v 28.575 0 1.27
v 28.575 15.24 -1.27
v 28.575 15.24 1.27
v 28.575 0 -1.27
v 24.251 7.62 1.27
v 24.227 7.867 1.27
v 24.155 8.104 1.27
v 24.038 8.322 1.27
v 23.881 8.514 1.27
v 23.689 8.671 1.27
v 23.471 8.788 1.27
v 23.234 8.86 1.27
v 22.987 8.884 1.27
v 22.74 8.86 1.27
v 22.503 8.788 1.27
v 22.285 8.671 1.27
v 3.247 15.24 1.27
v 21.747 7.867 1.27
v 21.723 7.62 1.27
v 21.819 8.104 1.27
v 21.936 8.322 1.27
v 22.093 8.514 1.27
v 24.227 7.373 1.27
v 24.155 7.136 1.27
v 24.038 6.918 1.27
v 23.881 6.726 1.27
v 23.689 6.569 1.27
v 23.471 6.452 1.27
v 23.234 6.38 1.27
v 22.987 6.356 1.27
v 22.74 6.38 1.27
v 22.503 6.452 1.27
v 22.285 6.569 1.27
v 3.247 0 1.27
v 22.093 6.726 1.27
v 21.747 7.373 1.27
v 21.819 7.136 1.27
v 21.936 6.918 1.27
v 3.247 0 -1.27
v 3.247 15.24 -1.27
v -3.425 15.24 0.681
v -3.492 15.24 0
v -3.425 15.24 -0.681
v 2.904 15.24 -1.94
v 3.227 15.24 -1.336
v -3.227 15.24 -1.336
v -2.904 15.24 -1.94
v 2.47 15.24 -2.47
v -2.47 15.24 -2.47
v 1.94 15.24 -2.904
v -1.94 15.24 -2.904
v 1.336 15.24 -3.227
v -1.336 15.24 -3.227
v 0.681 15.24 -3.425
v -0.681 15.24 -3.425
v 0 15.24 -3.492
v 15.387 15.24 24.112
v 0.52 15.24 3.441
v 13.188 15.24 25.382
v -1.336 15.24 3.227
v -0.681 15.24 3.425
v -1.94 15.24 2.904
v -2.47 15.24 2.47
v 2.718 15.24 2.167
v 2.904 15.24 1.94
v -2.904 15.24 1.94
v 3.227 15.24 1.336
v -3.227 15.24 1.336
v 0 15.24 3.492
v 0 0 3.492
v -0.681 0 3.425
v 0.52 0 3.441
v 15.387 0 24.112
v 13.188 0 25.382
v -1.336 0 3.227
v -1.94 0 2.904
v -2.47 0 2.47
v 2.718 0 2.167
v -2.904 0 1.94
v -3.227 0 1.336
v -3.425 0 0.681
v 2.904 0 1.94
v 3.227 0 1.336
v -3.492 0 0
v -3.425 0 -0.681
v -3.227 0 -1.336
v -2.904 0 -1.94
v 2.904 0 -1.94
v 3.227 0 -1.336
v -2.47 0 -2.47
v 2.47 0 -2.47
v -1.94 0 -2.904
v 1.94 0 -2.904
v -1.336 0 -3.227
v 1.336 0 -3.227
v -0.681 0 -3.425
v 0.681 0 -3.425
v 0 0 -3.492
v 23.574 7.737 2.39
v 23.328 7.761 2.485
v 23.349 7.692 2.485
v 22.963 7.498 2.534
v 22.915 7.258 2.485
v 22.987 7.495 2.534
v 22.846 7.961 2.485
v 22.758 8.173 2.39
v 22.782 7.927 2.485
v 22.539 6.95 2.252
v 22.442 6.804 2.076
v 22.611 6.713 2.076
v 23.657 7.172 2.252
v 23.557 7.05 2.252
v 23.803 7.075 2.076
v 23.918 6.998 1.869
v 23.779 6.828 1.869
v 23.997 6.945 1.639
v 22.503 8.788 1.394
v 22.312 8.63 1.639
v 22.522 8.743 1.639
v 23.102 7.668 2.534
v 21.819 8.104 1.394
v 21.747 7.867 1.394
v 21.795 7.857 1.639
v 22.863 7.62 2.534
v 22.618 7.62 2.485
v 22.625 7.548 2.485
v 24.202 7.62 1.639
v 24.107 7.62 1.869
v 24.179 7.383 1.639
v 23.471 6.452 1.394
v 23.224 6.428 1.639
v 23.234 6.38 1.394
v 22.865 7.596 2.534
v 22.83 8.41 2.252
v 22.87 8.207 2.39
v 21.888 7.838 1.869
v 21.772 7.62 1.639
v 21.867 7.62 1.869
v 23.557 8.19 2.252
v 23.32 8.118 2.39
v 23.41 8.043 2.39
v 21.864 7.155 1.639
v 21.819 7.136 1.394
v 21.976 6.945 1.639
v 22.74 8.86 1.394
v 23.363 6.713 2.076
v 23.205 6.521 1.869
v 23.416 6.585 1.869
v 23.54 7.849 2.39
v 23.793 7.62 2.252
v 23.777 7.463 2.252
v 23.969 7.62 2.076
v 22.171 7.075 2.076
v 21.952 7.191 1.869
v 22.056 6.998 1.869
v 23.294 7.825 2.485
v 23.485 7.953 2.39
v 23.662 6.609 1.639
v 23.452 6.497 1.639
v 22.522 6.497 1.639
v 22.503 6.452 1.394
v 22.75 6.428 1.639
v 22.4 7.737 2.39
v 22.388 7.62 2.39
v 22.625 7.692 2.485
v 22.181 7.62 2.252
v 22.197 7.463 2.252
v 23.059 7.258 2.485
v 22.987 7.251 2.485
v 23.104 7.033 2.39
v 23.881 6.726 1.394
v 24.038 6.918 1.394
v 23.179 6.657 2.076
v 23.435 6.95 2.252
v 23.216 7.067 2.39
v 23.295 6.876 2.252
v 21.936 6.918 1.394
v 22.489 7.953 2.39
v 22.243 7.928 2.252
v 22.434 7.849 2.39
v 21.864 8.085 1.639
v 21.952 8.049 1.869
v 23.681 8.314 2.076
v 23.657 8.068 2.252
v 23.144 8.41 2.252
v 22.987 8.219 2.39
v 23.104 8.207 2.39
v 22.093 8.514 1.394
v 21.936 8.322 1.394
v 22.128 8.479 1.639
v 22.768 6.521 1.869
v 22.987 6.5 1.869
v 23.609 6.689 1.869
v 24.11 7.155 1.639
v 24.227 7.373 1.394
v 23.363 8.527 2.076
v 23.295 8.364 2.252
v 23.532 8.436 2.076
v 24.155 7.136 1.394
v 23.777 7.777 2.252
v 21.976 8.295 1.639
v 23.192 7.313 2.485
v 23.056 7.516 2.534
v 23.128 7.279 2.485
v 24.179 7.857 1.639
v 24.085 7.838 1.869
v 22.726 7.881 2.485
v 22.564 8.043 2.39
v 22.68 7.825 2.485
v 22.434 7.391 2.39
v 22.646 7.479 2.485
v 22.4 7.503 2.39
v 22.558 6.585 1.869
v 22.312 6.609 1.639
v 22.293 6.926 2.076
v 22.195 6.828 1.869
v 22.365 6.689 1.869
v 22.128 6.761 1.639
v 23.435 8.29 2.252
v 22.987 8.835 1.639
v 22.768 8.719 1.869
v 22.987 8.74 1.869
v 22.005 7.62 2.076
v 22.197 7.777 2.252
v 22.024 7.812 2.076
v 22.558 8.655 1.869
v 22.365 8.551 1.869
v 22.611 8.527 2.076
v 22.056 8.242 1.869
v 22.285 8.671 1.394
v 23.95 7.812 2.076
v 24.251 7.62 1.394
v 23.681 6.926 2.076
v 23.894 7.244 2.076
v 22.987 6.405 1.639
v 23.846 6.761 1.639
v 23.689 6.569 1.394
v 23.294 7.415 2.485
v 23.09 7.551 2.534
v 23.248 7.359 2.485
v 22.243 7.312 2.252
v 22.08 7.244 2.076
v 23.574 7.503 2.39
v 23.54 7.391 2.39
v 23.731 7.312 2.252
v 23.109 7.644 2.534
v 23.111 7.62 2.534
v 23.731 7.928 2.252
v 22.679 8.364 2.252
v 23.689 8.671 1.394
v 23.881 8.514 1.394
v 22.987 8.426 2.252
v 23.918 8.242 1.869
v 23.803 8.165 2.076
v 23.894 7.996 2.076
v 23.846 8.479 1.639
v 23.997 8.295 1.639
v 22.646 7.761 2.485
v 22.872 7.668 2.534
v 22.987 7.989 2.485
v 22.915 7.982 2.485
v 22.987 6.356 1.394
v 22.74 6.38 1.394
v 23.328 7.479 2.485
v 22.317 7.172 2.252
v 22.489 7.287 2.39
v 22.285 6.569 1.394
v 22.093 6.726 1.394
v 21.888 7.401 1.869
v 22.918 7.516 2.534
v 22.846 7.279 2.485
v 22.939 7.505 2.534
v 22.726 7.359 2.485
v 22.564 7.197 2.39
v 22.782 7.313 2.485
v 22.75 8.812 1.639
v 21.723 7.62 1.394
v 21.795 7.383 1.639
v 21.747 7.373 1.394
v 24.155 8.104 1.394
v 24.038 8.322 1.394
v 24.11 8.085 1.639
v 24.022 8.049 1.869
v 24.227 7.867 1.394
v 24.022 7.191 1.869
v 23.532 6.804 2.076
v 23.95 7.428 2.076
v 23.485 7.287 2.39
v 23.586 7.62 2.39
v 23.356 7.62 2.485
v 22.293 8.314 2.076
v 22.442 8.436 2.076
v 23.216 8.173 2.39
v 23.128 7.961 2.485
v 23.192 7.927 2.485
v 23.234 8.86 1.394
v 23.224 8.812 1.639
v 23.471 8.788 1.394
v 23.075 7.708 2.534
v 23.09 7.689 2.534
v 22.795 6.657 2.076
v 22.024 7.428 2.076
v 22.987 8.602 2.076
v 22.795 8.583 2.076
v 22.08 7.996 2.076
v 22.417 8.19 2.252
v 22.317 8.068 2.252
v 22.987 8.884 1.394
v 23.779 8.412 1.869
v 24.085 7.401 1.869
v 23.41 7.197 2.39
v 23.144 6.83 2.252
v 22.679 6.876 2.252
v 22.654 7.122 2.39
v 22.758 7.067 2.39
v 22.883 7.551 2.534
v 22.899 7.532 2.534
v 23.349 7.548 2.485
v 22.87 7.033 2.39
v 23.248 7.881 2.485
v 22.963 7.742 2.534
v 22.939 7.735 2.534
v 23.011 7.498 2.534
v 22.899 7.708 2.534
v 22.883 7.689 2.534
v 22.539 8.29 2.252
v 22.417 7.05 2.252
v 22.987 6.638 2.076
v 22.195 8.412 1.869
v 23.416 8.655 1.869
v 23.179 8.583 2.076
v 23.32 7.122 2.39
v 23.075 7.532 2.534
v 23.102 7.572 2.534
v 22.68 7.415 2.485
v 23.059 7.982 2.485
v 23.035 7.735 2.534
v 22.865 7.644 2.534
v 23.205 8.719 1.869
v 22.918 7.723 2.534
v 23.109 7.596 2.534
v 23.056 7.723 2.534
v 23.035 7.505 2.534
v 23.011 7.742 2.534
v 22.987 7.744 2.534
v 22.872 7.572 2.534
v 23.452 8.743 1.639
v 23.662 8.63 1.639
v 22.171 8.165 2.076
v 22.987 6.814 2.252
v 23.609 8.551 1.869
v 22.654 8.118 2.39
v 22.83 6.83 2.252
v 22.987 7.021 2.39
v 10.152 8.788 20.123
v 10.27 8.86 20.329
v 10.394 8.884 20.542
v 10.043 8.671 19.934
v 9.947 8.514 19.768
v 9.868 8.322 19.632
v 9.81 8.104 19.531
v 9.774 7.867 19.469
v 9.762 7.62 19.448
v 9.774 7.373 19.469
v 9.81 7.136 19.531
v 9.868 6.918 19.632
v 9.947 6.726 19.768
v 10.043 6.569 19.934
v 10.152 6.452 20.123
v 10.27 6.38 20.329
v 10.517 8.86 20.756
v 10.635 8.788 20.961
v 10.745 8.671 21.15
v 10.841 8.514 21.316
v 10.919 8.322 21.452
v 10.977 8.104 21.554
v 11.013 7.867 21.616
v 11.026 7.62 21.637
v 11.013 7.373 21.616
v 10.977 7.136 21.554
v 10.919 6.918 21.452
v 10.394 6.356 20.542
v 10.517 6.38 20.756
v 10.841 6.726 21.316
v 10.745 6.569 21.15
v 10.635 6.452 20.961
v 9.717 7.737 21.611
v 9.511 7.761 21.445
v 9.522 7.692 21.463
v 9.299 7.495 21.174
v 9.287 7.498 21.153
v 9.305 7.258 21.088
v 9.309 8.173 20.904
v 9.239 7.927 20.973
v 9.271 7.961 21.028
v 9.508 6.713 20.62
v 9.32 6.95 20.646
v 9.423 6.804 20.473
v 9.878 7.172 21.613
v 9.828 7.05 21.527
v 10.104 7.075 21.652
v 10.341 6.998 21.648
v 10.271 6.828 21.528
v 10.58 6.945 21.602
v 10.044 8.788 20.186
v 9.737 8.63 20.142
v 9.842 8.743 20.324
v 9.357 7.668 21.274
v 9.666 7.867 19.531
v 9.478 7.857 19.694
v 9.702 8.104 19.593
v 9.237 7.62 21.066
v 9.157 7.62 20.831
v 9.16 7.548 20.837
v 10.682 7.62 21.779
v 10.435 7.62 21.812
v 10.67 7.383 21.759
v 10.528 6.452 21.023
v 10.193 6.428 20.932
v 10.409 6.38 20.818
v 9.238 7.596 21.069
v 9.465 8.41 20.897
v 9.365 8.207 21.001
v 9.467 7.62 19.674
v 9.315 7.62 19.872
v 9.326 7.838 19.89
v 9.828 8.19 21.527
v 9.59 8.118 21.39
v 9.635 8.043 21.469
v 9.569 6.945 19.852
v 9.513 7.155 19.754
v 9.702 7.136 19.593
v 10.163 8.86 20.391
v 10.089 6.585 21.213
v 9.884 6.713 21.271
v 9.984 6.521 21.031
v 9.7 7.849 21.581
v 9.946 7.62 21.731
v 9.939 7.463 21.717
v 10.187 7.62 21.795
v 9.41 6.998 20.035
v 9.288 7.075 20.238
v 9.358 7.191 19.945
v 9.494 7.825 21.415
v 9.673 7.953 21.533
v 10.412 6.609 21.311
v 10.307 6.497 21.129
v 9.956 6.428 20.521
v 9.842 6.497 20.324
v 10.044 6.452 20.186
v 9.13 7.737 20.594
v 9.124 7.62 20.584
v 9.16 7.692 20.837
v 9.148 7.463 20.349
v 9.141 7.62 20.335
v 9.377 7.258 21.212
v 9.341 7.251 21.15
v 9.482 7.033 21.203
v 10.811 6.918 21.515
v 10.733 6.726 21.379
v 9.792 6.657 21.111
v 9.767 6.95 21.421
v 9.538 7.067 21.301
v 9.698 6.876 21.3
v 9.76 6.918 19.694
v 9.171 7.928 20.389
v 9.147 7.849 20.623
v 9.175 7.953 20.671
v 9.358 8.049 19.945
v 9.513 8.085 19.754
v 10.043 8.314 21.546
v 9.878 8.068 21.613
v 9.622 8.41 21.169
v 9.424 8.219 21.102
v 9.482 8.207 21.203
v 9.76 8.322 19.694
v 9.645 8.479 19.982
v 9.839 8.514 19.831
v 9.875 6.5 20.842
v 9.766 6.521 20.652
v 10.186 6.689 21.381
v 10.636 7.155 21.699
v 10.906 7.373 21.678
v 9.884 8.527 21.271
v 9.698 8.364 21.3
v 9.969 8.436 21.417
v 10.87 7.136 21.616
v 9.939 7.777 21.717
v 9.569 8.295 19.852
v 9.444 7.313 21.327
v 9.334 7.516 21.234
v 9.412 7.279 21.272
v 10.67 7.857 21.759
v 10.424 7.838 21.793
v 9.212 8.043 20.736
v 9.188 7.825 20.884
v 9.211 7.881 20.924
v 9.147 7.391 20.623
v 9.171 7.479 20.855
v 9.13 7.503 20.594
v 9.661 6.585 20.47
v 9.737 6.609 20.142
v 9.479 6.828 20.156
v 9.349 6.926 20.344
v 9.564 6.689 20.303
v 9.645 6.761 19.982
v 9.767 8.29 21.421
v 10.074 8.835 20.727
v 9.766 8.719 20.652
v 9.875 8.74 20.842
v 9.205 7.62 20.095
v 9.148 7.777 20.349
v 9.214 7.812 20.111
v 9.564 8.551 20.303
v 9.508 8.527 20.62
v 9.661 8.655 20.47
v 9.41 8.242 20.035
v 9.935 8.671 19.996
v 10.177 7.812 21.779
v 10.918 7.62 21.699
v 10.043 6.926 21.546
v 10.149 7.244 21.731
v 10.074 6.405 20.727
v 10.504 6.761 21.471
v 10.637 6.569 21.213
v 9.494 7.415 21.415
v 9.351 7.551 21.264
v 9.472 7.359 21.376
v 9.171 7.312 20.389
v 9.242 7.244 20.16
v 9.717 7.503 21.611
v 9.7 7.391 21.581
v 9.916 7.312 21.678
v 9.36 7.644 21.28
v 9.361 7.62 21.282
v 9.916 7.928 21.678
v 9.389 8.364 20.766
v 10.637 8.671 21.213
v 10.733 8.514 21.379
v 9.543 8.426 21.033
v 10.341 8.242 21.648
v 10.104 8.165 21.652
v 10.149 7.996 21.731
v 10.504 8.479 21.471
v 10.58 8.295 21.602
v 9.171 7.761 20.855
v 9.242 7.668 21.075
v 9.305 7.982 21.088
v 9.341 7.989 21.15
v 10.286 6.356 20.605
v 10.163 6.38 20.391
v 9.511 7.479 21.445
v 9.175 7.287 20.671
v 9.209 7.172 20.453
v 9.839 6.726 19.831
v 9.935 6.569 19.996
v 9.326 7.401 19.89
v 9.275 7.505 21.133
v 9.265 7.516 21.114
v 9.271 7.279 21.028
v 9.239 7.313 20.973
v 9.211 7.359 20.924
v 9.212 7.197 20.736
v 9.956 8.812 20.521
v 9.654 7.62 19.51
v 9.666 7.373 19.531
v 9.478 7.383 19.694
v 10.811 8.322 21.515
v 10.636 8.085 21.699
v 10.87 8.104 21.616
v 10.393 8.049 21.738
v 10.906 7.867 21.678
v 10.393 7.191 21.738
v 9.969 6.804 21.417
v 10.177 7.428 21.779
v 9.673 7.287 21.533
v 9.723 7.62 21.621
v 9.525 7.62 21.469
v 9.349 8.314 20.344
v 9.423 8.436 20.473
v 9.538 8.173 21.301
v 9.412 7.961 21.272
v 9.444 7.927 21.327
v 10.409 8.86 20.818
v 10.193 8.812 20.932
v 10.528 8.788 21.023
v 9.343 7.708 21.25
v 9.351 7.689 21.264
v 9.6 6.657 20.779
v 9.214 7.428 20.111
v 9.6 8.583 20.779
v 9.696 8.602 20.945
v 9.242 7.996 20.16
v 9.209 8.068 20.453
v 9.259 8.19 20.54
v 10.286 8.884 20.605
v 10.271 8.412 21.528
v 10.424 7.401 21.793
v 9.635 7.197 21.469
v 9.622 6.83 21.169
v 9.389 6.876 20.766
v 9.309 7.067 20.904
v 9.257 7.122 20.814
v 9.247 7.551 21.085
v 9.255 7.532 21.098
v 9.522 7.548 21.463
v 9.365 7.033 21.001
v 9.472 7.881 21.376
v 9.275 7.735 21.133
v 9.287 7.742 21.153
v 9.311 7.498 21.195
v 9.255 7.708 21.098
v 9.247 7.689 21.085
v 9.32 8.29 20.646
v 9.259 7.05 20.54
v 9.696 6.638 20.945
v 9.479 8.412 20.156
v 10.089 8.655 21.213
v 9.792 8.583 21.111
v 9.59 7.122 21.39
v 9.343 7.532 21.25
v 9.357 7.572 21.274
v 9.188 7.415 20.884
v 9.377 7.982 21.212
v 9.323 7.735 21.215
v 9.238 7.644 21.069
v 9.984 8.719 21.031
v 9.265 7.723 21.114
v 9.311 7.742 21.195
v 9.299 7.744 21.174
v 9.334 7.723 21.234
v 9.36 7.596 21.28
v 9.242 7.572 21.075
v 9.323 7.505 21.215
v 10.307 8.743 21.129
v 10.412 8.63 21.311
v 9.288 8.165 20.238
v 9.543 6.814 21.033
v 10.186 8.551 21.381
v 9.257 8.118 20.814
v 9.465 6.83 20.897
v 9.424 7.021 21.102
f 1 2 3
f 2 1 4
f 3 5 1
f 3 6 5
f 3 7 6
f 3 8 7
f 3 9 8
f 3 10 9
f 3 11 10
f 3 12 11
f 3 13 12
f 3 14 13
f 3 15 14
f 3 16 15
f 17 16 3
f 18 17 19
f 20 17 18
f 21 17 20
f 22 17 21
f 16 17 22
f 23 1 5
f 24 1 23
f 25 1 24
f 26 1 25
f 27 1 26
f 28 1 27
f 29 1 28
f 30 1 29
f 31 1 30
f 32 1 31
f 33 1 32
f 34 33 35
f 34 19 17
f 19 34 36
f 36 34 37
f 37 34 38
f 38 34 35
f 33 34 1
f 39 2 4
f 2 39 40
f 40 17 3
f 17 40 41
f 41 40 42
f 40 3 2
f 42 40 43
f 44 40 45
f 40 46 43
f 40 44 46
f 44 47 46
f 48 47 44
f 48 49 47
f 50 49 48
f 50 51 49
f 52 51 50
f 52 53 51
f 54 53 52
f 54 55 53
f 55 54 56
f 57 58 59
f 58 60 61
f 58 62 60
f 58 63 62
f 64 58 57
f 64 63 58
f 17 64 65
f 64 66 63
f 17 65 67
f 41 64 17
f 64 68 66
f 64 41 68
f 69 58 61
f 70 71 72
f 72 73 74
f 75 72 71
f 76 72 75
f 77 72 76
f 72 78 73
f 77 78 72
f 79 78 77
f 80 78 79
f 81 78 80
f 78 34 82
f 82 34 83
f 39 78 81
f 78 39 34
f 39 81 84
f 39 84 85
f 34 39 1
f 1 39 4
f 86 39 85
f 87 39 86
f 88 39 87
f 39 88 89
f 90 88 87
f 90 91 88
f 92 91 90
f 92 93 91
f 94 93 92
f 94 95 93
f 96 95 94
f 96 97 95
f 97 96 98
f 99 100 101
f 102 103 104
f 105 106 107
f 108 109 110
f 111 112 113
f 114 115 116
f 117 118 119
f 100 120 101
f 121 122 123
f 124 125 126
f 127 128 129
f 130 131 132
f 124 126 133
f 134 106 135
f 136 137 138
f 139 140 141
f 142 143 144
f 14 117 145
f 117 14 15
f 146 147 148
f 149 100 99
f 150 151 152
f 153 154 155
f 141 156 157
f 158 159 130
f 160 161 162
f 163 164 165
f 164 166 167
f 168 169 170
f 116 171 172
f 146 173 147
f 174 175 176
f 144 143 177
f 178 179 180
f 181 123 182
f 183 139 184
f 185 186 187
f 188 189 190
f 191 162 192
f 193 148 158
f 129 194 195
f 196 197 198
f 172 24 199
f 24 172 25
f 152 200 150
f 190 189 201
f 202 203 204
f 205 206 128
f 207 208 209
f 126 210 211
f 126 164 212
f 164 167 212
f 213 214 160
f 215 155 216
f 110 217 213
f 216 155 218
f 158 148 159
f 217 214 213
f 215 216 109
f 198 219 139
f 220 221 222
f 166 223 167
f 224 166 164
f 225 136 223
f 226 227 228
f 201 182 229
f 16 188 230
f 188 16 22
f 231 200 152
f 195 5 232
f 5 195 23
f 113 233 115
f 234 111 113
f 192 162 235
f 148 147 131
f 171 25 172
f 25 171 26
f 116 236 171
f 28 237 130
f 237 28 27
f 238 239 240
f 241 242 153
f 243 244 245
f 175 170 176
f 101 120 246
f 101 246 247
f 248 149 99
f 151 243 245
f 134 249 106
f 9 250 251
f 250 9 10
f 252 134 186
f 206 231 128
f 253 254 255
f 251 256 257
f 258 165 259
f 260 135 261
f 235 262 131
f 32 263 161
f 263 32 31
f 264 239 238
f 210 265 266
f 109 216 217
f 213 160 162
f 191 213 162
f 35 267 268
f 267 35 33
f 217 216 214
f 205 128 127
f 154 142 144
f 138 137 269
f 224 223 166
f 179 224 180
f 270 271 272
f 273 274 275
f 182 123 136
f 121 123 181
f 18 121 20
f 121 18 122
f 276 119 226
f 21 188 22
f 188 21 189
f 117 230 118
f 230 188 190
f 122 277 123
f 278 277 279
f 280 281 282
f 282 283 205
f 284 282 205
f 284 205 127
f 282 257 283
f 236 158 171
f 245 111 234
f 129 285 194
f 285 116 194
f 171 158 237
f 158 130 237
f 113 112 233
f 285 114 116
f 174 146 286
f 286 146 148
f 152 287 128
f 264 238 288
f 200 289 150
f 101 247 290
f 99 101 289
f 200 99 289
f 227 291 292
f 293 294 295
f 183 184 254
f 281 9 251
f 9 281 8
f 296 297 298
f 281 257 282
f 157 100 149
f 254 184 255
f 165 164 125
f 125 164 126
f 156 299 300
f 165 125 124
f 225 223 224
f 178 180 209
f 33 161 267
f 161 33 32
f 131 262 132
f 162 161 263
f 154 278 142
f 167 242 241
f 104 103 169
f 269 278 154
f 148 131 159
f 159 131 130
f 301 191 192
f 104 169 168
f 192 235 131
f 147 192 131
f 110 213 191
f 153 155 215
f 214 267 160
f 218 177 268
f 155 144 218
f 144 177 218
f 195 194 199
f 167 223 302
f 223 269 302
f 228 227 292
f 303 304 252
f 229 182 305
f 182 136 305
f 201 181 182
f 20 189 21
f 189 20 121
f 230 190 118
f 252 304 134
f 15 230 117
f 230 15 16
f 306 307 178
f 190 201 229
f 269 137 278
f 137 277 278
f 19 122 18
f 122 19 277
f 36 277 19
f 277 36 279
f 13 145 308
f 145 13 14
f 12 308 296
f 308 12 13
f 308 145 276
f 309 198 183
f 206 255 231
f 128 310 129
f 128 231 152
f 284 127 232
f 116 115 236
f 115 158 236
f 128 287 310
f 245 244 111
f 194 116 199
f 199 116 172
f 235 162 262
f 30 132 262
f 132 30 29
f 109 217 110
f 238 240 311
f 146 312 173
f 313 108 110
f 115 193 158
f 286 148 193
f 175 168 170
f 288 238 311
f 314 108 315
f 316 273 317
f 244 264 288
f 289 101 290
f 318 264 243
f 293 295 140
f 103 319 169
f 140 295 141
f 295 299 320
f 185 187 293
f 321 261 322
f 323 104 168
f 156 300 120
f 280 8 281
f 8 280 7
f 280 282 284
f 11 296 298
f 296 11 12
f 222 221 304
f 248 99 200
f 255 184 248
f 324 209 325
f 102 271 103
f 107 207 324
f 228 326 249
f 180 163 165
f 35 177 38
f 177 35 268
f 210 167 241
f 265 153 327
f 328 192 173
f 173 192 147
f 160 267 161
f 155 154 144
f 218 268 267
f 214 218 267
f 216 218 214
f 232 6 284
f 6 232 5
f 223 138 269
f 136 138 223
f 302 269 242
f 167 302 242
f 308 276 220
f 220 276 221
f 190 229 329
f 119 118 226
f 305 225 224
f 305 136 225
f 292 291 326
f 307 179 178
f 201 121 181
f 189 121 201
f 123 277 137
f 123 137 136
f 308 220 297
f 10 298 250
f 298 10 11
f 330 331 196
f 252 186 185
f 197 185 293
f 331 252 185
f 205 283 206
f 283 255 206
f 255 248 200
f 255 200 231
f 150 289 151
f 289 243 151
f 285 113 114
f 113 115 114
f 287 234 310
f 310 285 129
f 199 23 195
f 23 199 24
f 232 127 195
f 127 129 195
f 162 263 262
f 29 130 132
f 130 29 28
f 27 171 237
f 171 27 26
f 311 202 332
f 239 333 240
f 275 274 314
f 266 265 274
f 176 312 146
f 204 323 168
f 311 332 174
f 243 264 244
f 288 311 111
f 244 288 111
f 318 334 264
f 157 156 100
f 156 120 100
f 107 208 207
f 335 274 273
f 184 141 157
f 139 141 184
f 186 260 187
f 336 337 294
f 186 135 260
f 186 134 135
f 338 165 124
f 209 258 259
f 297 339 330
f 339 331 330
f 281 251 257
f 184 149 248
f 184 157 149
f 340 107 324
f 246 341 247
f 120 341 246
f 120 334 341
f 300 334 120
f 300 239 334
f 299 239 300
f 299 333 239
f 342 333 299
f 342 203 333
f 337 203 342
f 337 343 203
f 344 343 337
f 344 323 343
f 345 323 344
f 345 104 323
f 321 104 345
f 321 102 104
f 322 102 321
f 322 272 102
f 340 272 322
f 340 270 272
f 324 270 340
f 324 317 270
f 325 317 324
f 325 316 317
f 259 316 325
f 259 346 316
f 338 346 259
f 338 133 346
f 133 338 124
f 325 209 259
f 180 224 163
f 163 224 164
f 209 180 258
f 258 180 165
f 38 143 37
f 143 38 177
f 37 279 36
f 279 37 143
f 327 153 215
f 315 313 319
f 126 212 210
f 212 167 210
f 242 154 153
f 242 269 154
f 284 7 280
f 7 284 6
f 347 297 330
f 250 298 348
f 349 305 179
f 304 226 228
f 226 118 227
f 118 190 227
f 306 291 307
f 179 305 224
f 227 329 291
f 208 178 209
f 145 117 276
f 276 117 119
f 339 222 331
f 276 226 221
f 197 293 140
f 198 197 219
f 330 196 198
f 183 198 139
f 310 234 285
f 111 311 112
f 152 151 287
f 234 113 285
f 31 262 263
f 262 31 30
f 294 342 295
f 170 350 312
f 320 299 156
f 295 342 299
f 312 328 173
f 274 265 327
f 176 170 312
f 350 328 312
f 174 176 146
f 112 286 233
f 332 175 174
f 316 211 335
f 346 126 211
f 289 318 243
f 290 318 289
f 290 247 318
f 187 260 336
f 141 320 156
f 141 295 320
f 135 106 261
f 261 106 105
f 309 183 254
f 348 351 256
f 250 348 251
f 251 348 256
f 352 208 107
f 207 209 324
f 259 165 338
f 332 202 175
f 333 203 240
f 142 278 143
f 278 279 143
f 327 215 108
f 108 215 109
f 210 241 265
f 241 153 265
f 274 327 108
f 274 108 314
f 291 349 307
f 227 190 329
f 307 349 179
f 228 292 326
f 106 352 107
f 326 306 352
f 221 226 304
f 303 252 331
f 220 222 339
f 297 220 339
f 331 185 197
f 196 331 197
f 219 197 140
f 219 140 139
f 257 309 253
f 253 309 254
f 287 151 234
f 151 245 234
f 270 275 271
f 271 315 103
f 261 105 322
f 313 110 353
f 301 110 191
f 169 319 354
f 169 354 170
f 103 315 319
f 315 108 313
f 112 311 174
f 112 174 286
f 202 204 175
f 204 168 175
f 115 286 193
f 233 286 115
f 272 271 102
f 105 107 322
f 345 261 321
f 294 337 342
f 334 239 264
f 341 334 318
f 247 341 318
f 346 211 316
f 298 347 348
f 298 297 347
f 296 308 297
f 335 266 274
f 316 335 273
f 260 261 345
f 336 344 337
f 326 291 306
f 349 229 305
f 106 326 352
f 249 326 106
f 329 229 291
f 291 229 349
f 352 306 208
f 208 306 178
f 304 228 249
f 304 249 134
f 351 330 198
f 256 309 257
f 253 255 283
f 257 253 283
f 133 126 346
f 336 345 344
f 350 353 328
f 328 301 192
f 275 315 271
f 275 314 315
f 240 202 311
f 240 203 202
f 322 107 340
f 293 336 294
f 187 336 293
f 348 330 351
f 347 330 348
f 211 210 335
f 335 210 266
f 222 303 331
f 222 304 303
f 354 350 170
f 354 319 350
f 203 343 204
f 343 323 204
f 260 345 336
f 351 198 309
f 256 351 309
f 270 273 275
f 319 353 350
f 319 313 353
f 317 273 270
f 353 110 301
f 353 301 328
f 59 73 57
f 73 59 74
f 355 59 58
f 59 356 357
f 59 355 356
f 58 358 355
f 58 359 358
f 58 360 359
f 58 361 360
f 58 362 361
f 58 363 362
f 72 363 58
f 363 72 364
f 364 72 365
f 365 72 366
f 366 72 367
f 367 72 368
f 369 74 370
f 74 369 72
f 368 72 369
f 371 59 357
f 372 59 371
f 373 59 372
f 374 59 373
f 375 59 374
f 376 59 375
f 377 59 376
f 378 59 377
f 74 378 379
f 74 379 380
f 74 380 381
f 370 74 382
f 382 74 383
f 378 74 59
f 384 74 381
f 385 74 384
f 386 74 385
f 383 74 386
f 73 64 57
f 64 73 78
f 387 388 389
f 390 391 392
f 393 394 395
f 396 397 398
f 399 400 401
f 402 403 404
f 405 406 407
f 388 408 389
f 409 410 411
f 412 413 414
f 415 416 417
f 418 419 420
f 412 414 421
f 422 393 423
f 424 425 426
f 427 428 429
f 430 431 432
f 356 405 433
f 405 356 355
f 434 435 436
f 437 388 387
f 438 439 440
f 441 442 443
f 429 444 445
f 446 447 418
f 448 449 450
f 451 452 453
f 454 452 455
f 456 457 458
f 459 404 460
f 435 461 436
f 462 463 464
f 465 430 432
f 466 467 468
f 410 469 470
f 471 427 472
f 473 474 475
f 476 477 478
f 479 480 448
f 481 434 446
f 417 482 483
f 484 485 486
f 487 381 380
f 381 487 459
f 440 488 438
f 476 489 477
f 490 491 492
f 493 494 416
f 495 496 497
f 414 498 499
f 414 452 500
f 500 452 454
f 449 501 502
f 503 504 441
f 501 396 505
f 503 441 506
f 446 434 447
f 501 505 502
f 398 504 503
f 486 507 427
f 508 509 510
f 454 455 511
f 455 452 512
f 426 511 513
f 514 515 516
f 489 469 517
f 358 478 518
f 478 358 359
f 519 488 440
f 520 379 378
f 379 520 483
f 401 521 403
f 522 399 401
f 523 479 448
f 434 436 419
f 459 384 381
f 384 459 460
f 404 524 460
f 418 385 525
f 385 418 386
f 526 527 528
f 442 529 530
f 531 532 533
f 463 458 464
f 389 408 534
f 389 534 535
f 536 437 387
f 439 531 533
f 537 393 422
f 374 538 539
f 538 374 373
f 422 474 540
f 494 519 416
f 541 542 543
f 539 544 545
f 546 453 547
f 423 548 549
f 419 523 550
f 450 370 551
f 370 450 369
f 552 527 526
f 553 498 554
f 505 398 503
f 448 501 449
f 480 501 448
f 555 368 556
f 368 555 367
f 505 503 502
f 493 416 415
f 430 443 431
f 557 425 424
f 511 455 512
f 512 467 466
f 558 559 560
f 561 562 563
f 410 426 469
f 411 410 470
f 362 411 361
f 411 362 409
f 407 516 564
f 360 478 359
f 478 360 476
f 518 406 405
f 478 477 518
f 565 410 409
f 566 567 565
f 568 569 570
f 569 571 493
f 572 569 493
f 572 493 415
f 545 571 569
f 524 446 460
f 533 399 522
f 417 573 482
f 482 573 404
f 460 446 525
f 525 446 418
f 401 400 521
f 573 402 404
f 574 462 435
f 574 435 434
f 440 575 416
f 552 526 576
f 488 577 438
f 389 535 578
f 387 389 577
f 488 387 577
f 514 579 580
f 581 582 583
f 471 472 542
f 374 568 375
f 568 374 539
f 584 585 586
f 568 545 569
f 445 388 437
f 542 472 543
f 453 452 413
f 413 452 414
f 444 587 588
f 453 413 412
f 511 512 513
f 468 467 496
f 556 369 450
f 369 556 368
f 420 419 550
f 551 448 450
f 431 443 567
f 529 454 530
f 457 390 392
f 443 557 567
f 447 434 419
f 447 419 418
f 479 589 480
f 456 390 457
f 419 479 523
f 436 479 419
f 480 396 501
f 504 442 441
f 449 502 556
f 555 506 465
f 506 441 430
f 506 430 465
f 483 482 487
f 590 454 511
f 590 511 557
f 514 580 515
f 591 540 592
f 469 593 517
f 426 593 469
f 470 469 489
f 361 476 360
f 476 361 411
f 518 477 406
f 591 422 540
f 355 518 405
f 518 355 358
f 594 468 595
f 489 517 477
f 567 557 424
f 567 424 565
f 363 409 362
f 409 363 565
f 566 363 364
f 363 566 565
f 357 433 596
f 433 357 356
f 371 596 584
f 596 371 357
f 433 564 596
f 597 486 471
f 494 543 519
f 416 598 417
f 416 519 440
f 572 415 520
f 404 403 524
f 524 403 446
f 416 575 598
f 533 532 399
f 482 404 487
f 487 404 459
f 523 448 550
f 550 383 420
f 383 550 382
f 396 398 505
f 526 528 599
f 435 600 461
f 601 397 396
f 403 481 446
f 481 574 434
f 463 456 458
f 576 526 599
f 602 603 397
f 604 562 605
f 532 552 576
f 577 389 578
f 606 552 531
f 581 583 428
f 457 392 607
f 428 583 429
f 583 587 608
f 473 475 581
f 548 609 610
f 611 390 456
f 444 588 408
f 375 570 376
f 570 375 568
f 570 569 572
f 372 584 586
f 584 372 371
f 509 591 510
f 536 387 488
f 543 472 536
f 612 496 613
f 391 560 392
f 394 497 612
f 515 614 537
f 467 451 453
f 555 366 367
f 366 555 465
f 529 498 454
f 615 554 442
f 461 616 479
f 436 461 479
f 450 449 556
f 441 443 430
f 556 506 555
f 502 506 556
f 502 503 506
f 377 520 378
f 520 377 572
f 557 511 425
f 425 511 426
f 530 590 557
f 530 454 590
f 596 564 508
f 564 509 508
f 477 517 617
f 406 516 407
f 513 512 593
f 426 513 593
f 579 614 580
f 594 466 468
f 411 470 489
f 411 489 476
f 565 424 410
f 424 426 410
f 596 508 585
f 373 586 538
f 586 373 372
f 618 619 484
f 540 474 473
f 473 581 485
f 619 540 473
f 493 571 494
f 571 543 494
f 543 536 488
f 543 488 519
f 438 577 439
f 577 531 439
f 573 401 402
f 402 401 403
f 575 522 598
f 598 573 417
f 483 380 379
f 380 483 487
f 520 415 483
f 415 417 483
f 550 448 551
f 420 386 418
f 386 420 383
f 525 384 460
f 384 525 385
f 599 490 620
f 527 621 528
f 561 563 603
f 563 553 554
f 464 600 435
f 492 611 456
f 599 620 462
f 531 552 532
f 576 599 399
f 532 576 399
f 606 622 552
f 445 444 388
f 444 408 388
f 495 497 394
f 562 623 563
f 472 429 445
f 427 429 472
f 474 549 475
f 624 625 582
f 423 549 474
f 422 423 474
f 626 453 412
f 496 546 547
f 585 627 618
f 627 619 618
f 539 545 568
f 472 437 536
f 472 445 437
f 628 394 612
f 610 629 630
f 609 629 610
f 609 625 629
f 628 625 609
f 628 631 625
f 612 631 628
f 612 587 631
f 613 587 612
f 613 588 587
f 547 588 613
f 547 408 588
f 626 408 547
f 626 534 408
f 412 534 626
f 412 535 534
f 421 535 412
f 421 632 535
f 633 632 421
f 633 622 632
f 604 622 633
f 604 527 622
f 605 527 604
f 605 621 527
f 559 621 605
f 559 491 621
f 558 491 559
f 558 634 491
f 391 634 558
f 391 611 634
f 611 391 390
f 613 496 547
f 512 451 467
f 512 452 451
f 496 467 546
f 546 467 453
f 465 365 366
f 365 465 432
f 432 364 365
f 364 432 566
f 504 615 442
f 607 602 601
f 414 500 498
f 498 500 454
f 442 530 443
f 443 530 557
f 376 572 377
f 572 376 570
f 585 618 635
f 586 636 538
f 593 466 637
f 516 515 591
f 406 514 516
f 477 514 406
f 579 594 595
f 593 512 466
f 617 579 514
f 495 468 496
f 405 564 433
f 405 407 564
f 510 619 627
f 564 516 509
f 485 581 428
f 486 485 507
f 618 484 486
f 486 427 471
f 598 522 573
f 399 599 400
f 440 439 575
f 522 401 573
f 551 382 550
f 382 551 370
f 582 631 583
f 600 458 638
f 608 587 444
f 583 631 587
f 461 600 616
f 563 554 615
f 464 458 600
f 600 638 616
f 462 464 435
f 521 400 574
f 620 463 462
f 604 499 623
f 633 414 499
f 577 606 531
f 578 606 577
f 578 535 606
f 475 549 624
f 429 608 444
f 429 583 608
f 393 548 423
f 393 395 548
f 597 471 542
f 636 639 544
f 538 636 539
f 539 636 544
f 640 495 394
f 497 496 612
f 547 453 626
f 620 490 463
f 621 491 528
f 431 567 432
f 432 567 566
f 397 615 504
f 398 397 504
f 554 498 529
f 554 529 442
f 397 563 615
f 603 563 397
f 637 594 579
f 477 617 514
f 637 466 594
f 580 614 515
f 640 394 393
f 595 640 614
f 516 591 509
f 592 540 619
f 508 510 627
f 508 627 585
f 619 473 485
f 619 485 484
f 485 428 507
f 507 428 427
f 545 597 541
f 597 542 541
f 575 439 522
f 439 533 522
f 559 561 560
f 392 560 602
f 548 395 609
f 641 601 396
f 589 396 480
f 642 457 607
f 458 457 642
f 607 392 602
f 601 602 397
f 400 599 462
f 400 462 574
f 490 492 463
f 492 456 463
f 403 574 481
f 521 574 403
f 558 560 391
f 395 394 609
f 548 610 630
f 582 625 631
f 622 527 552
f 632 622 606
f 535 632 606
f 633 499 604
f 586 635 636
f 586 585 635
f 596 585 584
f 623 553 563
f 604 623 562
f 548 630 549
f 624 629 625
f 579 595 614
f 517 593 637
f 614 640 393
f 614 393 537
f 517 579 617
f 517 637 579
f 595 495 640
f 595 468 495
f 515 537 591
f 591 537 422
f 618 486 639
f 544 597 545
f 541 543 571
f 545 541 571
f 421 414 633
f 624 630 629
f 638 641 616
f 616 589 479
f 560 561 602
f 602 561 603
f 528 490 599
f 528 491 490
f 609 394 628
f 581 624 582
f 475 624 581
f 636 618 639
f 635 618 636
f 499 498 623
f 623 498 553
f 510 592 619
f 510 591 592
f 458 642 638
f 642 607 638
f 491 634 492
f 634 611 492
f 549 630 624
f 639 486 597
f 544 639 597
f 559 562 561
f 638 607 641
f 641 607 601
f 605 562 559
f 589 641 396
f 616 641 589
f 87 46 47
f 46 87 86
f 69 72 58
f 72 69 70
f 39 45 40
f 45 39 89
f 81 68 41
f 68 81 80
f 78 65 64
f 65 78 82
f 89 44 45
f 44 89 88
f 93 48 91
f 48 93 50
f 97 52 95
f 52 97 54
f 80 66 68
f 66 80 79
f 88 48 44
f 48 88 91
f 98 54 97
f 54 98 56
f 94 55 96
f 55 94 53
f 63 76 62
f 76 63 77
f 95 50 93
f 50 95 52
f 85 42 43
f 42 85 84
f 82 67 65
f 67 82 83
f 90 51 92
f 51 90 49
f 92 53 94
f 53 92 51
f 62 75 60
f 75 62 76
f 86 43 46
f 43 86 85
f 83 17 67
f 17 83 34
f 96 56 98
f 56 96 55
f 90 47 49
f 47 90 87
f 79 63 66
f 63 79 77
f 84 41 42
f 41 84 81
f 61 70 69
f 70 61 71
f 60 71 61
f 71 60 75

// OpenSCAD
// file: FlaviaPrims.scad
// all measurements in inches
$fn=32; // round things are drawn in 32 segments

InnerWidth = 0.6;
SlotWidth = 0.3;
InnerThickness = 0.1;
TabLength = 1.0;
Offset = 0.125; 
JoinerWidth = SlotWidth * 1.5;

DoveTailSlotMul = 1.10;

BumpDia = 0.1;
BumpOffset = TabLength - 0.22; 

module GussetHub() {
  translate([-0.5*InnerWidth, -0.5 * InnerWidth, 0])
    cube([InnerWidth, InnerWidth, InnerThickness]);
}

module GussetPlate() {
  rotate([180, 0, 0]) translate([0.25*TabLength, -0.5 * InnerWidth, 0]) InnerPlate();
}

module InnerPlate() {
  cube([TabLength, InnerWidth, InnerThickness], false);
  translate([BumpOffset, InnerWidth * 0.5, InnerThickness]) sphere(d=BumpDia);
}

module InnerPlateBump() {
  InnerPlate();
  yoff = 0.5 * (InnerWidth - SlotWidth);
  translate([0, yoff, -InnerThickness]) cube([TabLength, SlotWidth, InnerThickness], false);
}

module JoinerPlate() {
  cube([TabLength, JoinerWidth, InnerThickness]);
}


module Tab() {
  translate([Offset, 0, -InnerThickness / 2]) InnerPlate(); 
}

module Hub() {
  rotate([-90, 0, 0]) cylinder(d = Offset * 2.2, h = InnerWidth); 
}

module F2x60() {
  Tab();
  rotate([0, -60, 0]) Tab();
}

module F3x60() {
  Tab();
  rotate([0, -60, 0]) Tab();
  rotate([0, -120, 0]) Tab();  
}

module F4x60() {
  F2x60();
  rotate([0, -120, 0]) F2x60();
}

module Corner() {
  InnerPlateBump();
  xshift = InnerWidth; // 0.5 * (TabLength - InnerWidth);
  yshift = InnerWidth + 0.2;
  translate([xshift, yshift, 0]) rotate([0, 0, 90]) InnerPlateBump();
  xjshift = JoinerWidth + 0.5 * (InnerWidth - JoinerWidth);
  yjshift = 0.5 * (InnerWidth - SlotWidth);
  translate([xjshift, yjshift, -2 * InnerThickness]) rotate([0, 0, 90]) JoinerPlate();
}
// main file
// Joiner widget for the plastic rails that come with
// Flavia coffee packets.
$fn=32; // round things are drawn in 32 segments
include <FlaviaPrims.scad>

scale([25.4,25.4,25.4]) { // scale from inches to mm
  Hub();			
  F2x60();
}
